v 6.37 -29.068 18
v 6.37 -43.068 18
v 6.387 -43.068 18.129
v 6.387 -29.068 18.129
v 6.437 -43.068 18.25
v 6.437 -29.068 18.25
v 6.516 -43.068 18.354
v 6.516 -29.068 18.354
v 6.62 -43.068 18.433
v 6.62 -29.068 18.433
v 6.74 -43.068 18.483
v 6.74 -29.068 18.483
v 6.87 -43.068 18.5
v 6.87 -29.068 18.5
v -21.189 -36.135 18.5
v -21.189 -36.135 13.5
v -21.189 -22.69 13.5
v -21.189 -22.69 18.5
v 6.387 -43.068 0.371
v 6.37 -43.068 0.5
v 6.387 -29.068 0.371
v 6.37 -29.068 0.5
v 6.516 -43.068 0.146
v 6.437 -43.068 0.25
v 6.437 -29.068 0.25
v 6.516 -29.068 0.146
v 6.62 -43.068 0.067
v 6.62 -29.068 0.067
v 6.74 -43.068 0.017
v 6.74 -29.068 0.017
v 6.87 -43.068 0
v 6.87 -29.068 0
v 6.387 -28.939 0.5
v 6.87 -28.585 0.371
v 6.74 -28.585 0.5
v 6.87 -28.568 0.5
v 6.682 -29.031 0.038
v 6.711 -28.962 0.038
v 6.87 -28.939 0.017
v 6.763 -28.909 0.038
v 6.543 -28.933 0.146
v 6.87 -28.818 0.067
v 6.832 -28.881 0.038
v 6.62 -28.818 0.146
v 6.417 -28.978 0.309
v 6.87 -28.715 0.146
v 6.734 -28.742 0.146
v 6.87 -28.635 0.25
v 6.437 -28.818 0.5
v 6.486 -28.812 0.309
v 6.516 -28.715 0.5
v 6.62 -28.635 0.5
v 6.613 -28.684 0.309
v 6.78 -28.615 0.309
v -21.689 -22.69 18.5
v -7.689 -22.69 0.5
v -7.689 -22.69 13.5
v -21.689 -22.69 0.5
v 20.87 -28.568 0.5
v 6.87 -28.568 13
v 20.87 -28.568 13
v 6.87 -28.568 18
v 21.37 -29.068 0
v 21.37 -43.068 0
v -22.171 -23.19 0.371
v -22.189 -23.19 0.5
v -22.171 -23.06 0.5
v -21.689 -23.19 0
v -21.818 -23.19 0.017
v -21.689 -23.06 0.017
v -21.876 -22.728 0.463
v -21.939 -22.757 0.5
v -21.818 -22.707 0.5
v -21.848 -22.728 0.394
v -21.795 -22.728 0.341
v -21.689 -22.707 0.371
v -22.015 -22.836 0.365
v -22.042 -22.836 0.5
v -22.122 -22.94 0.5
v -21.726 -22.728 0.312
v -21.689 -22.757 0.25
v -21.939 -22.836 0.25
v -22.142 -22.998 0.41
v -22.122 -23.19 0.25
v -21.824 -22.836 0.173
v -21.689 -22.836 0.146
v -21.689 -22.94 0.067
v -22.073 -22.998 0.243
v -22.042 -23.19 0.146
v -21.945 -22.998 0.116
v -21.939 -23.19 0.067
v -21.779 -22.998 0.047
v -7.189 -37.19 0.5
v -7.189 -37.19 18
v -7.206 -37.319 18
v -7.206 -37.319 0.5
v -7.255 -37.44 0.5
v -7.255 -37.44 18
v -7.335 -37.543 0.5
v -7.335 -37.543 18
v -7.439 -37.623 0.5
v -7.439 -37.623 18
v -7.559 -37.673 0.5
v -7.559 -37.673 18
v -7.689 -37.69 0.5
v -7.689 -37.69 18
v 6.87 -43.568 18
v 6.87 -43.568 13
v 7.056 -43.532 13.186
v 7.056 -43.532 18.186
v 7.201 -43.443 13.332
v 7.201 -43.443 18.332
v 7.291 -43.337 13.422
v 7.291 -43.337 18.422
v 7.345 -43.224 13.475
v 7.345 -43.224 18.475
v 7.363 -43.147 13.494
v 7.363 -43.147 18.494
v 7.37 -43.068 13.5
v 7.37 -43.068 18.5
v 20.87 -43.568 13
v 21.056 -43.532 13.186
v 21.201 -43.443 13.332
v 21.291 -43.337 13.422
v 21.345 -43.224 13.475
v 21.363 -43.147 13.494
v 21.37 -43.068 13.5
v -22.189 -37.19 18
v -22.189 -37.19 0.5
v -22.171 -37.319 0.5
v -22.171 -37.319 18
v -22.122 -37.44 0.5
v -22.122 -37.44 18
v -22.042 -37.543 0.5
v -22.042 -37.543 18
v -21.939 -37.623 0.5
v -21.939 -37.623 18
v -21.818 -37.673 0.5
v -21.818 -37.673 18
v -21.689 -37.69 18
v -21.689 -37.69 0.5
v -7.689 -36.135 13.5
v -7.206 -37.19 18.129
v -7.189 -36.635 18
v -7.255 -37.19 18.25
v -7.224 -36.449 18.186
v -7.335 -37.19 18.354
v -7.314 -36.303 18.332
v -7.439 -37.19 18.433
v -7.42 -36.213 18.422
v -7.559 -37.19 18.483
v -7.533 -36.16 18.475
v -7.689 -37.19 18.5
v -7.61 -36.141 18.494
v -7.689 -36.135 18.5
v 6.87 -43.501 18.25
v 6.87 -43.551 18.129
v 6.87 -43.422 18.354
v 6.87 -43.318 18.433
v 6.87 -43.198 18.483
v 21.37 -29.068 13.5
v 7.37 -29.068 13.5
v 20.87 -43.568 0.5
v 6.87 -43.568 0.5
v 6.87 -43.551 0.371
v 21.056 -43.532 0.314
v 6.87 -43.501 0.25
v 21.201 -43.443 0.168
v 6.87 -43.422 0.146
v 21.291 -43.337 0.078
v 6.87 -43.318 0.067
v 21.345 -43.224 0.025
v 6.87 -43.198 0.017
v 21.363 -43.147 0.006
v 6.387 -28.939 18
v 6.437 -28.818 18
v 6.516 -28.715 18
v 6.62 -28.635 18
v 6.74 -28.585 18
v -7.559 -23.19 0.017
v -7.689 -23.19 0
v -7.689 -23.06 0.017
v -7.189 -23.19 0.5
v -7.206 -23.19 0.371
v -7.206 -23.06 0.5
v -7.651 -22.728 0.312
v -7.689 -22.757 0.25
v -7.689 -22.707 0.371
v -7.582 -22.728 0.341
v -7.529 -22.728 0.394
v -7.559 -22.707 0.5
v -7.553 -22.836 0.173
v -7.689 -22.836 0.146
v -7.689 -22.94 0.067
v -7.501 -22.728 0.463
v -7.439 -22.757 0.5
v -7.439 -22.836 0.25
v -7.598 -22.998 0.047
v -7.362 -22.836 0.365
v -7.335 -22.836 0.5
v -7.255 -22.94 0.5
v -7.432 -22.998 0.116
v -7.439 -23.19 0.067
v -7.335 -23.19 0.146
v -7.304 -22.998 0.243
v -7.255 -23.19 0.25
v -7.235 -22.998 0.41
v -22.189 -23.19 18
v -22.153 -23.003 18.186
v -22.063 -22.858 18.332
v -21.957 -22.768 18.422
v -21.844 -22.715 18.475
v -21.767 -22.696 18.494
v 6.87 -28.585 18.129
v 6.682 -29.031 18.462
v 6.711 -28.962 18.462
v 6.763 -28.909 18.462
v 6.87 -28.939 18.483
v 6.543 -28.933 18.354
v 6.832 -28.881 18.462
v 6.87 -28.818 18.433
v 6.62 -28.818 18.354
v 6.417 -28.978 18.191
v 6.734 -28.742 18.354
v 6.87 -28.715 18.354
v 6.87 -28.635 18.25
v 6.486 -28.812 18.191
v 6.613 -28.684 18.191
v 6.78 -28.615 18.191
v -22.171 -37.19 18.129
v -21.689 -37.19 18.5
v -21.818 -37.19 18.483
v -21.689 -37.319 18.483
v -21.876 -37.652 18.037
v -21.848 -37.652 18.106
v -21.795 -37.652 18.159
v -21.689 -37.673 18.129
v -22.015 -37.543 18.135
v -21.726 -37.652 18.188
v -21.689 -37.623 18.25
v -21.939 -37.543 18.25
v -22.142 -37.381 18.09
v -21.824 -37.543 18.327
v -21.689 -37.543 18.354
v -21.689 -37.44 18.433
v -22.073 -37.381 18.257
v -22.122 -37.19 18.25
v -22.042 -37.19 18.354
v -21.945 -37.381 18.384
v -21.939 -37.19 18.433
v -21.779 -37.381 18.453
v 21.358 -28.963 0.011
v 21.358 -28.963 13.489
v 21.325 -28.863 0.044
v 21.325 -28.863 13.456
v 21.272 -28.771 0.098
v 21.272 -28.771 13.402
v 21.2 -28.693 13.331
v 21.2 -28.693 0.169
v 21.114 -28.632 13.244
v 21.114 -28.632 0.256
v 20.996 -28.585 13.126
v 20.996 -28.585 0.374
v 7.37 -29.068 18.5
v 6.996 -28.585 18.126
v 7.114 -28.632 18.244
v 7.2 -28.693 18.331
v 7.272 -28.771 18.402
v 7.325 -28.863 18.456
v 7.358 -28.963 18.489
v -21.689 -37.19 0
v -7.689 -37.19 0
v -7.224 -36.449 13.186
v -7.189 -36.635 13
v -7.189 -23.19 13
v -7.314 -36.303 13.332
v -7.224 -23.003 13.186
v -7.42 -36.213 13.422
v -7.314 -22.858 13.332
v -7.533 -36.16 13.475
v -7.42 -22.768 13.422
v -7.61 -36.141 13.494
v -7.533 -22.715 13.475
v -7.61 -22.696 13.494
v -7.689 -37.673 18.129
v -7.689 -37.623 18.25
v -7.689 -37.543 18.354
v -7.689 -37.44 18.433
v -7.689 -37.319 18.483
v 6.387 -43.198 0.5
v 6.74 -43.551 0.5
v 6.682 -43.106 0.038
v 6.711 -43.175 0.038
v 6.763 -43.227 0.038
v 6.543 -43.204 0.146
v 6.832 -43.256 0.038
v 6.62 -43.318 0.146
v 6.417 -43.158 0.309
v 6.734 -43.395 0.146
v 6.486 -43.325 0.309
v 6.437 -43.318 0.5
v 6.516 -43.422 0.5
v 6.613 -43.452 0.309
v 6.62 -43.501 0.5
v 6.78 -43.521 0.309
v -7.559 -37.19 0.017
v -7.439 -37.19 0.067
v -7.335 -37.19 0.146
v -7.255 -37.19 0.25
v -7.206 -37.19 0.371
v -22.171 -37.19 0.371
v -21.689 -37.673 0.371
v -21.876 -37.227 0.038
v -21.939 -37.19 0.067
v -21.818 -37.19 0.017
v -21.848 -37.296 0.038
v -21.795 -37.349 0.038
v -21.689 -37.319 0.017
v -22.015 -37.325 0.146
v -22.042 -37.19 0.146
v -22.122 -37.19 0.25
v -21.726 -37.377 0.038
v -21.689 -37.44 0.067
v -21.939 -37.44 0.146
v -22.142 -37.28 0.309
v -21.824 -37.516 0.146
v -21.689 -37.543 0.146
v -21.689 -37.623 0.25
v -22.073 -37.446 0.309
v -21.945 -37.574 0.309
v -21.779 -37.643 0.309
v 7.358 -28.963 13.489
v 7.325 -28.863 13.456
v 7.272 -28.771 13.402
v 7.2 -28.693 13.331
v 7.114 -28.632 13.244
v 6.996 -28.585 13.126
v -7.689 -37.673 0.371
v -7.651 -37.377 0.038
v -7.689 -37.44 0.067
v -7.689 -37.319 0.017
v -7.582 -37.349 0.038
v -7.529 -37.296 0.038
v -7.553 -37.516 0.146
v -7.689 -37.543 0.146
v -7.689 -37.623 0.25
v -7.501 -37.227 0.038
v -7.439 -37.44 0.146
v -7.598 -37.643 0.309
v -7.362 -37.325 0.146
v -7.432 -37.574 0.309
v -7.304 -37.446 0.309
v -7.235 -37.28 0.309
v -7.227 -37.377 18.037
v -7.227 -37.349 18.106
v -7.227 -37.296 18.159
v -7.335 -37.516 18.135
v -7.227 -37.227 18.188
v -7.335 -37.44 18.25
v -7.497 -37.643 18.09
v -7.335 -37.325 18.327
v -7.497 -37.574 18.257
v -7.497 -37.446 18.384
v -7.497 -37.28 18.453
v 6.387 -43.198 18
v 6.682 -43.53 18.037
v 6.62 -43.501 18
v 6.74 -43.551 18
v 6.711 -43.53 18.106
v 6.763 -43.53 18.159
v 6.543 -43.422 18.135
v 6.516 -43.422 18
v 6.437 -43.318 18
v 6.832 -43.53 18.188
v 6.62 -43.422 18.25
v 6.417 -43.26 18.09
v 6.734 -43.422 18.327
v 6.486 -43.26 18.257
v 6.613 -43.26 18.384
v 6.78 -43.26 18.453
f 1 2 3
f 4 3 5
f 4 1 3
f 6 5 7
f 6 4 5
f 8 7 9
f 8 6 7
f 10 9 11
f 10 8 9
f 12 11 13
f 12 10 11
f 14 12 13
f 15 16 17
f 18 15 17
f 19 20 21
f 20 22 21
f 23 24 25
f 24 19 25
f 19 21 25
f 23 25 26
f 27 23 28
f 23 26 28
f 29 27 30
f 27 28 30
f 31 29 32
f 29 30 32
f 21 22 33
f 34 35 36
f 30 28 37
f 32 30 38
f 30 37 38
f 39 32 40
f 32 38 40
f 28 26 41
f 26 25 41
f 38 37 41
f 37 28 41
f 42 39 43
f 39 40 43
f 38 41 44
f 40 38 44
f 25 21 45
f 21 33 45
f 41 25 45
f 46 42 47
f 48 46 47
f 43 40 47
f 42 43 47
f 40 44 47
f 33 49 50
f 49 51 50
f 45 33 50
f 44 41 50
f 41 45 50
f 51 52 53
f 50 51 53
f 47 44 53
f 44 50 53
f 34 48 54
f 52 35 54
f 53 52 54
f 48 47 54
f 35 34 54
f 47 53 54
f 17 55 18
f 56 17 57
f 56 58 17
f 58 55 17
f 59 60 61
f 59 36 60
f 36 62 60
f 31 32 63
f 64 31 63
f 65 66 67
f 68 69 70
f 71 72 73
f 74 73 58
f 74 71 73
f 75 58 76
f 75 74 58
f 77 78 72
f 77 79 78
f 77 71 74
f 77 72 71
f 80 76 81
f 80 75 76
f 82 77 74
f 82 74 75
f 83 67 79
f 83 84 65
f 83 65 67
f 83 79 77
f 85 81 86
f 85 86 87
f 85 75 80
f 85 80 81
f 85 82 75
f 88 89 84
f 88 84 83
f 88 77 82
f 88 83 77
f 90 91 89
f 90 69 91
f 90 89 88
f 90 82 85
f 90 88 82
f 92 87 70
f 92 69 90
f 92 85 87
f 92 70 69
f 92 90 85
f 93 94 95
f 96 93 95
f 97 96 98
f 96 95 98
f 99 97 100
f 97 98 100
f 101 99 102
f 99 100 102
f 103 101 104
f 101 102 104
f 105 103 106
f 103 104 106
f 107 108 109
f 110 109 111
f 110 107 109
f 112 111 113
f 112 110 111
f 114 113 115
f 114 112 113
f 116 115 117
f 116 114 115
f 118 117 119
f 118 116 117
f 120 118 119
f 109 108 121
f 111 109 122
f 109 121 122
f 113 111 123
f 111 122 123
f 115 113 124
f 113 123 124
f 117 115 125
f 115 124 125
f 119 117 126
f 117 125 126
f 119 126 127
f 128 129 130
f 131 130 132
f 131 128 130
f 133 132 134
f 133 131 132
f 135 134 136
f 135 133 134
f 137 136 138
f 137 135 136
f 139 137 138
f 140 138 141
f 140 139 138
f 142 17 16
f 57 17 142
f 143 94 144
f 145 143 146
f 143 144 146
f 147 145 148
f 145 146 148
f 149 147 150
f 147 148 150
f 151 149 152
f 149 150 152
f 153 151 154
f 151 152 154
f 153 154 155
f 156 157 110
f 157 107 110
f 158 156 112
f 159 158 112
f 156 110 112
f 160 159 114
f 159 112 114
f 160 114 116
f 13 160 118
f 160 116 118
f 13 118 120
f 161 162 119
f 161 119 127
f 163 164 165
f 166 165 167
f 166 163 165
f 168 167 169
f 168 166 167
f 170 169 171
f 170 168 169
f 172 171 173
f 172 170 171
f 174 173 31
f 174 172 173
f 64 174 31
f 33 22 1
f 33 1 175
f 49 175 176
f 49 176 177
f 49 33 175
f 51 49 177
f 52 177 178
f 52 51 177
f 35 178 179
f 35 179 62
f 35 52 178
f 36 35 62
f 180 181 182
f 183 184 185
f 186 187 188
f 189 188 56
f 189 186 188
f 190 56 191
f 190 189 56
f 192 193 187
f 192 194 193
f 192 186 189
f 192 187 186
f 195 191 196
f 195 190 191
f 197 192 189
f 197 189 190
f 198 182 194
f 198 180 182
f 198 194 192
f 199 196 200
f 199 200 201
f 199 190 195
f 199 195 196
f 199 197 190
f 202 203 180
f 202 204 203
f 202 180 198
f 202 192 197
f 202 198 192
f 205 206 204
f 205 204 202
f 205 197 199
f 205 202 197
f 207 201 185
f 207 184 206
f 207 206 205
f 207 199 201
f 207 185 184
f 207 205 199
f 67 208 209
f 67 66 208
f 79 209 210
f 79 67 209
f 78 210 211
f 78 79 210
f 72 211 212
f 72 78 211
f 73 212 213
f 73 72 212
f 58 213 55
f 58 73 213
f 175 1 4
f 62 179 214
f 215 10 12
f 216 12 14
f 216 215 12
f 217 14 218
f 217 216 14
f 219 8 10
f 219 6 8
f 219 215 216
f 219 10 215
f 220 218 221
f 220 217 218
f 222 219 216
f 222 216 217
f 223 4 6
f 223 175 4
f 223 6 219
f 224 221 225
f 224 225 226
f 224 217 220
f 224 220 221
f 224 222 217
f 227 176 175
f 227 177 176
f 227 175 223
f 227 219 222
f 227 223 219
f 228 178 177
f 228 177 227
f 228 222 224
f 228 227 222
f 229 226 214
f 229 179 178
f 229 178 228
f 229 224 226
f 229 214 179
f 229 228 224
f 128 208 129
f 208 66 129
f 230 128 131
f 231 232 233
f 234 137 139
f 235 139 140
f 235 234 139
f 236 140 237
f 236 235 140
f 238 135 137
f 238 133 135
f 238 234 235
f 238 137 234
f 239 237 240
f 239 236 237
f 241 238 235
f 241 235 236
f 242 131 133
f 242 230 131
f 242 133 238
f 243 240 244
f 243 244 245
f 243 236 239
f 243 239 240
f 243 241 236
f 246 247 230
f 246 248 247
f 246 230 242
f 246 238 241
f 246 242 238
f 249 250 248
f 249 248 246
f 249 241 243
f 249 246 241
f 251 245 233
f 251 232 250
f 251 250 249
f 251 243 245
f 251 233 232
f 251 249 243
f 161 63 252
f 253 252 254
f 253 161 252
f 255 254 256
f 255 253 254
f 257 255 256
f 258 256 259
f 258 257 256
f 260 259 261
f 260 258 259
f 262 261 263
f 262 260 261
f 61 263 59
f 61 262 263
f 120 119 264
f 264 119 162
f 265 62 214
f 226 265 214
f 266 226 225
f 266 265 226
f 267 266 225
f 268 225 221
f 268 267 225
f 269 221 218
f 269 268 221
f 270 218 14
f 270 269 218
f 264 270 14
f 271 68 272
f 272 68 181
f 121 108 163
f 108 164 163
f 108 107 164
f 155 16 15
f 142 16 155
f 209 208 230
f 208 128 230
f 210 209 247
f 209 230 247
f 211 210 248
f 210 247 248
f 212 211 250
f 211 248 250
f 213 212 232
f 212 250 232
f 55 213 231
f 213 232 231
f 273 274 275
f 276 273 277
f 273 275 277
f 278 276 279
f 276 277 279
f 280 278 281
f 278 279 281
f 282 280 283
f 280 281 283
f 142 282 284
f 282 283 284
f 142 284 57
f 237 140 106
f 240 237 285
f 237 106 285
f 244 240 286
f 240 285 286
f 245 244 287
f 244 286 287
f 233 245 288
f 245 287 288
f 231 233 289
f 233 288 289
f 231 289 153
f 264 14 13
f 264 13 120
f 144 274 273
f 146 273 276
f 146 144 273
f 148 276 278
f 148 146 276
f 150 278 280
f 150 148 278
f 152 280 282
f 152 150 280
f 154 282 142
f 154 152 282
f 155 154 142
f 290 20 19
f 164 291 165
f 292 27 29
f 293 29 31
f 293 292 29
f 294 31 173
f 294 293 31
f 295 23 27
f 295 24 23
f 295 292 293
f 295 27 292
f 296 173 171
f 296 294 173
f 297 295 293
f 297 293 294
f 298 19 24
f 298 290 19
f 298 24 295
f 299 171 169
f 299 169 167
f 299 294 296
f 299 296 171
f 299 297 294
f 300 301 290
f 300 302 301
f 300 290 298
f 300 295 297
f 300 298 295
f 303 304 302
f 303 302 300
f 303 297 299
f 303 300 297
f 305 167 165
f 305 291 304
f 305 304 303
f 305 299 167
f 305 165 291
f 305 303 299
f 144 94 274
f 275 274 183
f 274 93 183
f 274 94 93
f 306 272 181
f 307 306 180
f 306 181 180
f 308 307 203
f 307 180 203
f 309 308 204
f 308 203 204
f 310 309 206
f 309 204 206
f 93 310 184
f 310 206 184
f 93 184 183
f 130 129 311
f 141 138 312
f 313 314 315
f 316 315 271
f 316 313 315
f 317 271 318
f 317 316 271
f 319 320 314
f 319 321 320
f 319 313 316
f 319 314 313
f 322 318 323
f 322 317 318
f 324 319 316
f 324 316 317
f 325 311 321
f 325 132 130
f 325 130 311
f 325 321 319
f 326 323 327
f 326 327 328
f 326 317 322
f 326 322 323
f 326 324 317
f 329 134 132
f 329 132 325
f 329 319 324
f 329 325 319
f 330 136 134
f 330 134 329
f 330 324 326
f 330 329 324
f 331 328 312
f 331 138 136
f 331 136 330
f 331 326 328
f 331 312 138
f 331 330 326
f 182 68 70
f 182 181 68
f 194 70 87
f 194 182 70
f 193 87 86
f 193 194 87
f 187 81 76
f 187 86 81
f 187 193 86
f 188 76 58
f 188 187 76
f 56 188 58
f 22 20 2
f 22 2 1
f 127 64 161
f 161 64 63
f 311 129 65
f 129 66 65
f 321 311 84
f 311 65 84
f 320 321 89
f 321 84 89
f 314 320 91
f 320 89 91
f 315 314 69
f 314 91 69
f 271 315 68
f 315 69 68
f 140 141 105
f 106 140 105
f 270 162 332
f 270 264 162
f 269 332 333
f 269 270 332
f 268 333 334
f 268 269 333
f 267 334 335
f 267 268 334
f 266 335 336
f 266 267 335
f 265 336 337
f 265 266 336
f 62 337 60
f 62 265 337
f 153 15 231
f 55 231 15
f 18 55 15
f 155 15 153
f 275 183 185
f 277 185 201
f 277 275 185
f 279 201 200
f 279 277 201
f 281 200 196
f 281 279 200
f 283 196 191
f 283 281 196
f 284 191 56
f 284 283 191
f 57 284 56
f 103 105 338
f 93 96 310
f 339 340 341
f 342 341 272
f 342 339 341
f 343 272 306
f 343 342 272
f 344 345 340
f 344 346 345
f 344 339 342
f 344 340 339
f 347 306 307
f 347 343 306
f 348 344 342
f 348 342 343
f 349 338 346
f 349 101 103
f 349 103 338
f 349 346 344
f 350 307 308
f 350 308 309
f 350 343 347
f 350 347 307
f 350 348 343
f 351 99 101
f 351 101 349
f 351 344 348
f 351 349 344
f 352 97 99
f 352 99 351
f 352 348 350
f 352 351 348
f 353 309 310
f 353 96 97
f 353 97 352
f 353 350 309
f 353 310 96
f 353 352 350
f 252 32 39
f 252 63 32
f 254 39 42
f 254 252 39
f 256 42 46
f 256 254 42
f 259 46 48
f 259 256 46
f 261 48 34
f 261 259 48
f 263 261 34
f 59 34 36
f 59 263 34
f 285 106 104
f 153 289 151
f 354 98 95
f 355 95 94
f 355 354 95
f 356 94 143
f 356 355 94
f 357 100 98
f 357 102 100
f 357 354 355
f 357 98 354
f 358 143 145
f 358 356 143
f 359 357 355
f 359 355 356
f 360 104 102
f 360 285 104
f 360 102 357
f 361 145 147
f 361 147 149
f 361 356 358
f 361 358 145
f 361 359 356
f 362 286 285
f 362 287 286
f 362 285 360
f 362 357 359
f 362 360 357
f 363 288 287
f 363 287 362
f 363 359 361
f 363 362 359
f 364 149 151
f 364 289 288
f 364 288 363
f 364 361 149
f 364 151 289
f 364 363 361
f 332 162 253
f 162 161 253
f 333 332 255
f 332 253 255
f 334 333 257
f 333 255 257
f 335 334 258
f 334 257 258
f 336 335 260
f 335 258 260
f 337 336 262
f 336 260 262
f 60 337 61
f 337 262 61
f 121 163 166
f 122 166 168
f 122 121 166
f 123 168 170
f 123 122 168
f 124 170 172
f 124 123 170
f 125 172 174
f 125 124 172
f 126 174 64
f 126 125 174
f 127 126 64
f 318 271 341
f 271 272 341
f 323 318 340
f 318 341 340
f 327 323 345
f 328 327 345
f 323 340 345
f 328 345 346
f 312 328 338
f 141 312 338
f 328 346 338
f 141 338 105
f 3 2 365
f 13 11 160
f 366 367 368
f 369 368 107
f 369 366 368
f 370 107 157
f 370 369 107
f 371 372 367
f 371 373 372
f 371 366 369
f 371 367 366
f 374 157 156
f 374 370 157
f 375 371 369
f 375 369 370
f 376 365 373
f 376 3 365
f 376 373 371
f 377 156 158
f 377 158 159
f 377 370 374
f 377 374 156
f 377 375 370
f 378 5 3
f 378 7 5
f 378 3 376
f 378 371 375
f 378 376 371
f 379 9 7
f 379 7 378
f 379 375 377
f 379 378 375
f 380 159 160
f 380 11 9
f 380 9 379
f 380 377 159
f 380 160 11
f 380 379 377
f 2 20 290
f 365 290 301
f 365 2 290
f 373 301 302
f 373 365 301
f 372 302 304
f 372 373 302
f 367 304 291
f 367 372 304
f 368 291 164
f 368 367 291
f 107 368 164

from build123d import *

# Parameters (mm, degrees)
F0_W     = 15
F0_H     = 15
F1_DEPTH = 13.5
F2_W     = 1
F2_H     = 13.4452538192
F2_H_2   = 1.5547461808
F2_W_2   = 14
F3_DEPTH = 5
F4_DEPTH = 5
F5_R     = 0.5
F6_W     = 15
F6_H     = 15
F7_DEPTH = 13.5
F8_W     = 1
F8_H     = 15
F9_DEPTH = 5
F10_R    = 0.49999


# Not quite as in the source:
# - a fillet or chamfer is up to 0.001 mm smaller than in the source, because OpenCascade refuses the exact size


with BuildPart() as f1:
    # F0 (on Top) → F1 (new body)
    with BuildSketch(Plane.XY):
        with Locations((-14.6885017678, -30.1897267997)):
            Rectangle(F0_W, F0_H)
    extrude(amount=F1_DEPTH)

    # F2 (on face) → F3 (join)
    with BuildSketch(Plane.XY.offset(13.5)):
        with Locations((-21.6885017678, -29.4123537093)):
            Rectangle(F2_W, F2_H)
        with Locations((-21.6885017678, -36.9123537093)):
            Rectangle(F2_W, F2_H_2)
        with Locations((-14.1885017678, -36.9123537093)):
            Rectangle(F2_W_2, F2_H_2)
    extrude(amount=F3_DEPTH)

    # F2 (on face) → F4 (join)
    with BuildSketch(Plane.XY.offset(13.5)):
        with Locations((-21.6885017678, -29.4123537093)):
            Rectangle(F2_W, F2_H)
        with Locations((-21.6885017678, -36.9123537093)):
            Rectangle(F2_W, F2_H_2)
        with Locations((-14.1885017678, -36.9123537093)):
            Rectangle(F2_W_2, F2_H_2)
    extrude(amount=F4_DEPTH)

    # F5
    f5_edges = [f1.edges().sort_by_distance(p)[0] for p in [
        (-22.188502, -30.189727, 18.5),
        (-22.188502, -37.689727, 9.25),
        (-22.188502, -30.189727, 0),
        (-22.188502, -22.689727, 9.25),
        (-14.688502, -37.689727, 18.5),
        (-7.188502, -37.689727, 9.25),
        (-14.688502, -37.689727, 0),
        (-7.188502, -30.189727, 0),
        (-14.688502, -22.689727, 0),
        (-7.188502, -36.912354, 18.5),
        (-7.188502, -36.134981, 16),
        (-7.188502, -29.412354, 13.5),
        (-7.188502, -22.689727, 6.75),
    ]]
    fillet(f5_edges, radius=F5_R)


with BuildPart() as f7:
    # F6 (on Top) → F7 (new body)
    with BuildSketch(Plane.XY):
        with Locations((13.8696695864, -36.0683391988)):
            Rectangle(F6_W, F6_H)
    extrude(amount=F7_DEPTH)

    # F8 (on face) → F9 (join)
    with BuildSketch(Plane.XY.offset(13.5)):
        with Locations((6.8696695864, -36.0683391988)):
            Rectangle(F8_W, F8_H)
    extrude(amount=F9_DEPTH)

    # F10 (radius 0.5 in the source; OpenCascade refuses exactly that, so slightly less here)
    f10_edges = [f7.edges().sort_by_distance(p)[0] for p in [
        (6.36967, -28.568339, 9.25),
        (6.36967, -36.068339, 18.5),
        (6.36967, -43.568339, 9.25),
        (6.36967, -36.068339, 0),
        (6.86967, -43.568339, 18.5),
        (7.36967, -43.568339, 16),
        (14.36967, -43.568339, 13.5),
        (21.36967, -43.568339, 6.75),
        (13.86967, -43.568339, 0),
        (21.36967, -28.568339, 6.75),
        (14.36967, -28.568339, 13.5),
        (7.36967, -28.568339, 16),
        (6.86967, -28.568339, 18.5),
        (13.86967, -28.568339, 0),
    ]]
    fillet(f10_edges, radius=F10_R)


solid = Compound([f1.part, f7.part])
